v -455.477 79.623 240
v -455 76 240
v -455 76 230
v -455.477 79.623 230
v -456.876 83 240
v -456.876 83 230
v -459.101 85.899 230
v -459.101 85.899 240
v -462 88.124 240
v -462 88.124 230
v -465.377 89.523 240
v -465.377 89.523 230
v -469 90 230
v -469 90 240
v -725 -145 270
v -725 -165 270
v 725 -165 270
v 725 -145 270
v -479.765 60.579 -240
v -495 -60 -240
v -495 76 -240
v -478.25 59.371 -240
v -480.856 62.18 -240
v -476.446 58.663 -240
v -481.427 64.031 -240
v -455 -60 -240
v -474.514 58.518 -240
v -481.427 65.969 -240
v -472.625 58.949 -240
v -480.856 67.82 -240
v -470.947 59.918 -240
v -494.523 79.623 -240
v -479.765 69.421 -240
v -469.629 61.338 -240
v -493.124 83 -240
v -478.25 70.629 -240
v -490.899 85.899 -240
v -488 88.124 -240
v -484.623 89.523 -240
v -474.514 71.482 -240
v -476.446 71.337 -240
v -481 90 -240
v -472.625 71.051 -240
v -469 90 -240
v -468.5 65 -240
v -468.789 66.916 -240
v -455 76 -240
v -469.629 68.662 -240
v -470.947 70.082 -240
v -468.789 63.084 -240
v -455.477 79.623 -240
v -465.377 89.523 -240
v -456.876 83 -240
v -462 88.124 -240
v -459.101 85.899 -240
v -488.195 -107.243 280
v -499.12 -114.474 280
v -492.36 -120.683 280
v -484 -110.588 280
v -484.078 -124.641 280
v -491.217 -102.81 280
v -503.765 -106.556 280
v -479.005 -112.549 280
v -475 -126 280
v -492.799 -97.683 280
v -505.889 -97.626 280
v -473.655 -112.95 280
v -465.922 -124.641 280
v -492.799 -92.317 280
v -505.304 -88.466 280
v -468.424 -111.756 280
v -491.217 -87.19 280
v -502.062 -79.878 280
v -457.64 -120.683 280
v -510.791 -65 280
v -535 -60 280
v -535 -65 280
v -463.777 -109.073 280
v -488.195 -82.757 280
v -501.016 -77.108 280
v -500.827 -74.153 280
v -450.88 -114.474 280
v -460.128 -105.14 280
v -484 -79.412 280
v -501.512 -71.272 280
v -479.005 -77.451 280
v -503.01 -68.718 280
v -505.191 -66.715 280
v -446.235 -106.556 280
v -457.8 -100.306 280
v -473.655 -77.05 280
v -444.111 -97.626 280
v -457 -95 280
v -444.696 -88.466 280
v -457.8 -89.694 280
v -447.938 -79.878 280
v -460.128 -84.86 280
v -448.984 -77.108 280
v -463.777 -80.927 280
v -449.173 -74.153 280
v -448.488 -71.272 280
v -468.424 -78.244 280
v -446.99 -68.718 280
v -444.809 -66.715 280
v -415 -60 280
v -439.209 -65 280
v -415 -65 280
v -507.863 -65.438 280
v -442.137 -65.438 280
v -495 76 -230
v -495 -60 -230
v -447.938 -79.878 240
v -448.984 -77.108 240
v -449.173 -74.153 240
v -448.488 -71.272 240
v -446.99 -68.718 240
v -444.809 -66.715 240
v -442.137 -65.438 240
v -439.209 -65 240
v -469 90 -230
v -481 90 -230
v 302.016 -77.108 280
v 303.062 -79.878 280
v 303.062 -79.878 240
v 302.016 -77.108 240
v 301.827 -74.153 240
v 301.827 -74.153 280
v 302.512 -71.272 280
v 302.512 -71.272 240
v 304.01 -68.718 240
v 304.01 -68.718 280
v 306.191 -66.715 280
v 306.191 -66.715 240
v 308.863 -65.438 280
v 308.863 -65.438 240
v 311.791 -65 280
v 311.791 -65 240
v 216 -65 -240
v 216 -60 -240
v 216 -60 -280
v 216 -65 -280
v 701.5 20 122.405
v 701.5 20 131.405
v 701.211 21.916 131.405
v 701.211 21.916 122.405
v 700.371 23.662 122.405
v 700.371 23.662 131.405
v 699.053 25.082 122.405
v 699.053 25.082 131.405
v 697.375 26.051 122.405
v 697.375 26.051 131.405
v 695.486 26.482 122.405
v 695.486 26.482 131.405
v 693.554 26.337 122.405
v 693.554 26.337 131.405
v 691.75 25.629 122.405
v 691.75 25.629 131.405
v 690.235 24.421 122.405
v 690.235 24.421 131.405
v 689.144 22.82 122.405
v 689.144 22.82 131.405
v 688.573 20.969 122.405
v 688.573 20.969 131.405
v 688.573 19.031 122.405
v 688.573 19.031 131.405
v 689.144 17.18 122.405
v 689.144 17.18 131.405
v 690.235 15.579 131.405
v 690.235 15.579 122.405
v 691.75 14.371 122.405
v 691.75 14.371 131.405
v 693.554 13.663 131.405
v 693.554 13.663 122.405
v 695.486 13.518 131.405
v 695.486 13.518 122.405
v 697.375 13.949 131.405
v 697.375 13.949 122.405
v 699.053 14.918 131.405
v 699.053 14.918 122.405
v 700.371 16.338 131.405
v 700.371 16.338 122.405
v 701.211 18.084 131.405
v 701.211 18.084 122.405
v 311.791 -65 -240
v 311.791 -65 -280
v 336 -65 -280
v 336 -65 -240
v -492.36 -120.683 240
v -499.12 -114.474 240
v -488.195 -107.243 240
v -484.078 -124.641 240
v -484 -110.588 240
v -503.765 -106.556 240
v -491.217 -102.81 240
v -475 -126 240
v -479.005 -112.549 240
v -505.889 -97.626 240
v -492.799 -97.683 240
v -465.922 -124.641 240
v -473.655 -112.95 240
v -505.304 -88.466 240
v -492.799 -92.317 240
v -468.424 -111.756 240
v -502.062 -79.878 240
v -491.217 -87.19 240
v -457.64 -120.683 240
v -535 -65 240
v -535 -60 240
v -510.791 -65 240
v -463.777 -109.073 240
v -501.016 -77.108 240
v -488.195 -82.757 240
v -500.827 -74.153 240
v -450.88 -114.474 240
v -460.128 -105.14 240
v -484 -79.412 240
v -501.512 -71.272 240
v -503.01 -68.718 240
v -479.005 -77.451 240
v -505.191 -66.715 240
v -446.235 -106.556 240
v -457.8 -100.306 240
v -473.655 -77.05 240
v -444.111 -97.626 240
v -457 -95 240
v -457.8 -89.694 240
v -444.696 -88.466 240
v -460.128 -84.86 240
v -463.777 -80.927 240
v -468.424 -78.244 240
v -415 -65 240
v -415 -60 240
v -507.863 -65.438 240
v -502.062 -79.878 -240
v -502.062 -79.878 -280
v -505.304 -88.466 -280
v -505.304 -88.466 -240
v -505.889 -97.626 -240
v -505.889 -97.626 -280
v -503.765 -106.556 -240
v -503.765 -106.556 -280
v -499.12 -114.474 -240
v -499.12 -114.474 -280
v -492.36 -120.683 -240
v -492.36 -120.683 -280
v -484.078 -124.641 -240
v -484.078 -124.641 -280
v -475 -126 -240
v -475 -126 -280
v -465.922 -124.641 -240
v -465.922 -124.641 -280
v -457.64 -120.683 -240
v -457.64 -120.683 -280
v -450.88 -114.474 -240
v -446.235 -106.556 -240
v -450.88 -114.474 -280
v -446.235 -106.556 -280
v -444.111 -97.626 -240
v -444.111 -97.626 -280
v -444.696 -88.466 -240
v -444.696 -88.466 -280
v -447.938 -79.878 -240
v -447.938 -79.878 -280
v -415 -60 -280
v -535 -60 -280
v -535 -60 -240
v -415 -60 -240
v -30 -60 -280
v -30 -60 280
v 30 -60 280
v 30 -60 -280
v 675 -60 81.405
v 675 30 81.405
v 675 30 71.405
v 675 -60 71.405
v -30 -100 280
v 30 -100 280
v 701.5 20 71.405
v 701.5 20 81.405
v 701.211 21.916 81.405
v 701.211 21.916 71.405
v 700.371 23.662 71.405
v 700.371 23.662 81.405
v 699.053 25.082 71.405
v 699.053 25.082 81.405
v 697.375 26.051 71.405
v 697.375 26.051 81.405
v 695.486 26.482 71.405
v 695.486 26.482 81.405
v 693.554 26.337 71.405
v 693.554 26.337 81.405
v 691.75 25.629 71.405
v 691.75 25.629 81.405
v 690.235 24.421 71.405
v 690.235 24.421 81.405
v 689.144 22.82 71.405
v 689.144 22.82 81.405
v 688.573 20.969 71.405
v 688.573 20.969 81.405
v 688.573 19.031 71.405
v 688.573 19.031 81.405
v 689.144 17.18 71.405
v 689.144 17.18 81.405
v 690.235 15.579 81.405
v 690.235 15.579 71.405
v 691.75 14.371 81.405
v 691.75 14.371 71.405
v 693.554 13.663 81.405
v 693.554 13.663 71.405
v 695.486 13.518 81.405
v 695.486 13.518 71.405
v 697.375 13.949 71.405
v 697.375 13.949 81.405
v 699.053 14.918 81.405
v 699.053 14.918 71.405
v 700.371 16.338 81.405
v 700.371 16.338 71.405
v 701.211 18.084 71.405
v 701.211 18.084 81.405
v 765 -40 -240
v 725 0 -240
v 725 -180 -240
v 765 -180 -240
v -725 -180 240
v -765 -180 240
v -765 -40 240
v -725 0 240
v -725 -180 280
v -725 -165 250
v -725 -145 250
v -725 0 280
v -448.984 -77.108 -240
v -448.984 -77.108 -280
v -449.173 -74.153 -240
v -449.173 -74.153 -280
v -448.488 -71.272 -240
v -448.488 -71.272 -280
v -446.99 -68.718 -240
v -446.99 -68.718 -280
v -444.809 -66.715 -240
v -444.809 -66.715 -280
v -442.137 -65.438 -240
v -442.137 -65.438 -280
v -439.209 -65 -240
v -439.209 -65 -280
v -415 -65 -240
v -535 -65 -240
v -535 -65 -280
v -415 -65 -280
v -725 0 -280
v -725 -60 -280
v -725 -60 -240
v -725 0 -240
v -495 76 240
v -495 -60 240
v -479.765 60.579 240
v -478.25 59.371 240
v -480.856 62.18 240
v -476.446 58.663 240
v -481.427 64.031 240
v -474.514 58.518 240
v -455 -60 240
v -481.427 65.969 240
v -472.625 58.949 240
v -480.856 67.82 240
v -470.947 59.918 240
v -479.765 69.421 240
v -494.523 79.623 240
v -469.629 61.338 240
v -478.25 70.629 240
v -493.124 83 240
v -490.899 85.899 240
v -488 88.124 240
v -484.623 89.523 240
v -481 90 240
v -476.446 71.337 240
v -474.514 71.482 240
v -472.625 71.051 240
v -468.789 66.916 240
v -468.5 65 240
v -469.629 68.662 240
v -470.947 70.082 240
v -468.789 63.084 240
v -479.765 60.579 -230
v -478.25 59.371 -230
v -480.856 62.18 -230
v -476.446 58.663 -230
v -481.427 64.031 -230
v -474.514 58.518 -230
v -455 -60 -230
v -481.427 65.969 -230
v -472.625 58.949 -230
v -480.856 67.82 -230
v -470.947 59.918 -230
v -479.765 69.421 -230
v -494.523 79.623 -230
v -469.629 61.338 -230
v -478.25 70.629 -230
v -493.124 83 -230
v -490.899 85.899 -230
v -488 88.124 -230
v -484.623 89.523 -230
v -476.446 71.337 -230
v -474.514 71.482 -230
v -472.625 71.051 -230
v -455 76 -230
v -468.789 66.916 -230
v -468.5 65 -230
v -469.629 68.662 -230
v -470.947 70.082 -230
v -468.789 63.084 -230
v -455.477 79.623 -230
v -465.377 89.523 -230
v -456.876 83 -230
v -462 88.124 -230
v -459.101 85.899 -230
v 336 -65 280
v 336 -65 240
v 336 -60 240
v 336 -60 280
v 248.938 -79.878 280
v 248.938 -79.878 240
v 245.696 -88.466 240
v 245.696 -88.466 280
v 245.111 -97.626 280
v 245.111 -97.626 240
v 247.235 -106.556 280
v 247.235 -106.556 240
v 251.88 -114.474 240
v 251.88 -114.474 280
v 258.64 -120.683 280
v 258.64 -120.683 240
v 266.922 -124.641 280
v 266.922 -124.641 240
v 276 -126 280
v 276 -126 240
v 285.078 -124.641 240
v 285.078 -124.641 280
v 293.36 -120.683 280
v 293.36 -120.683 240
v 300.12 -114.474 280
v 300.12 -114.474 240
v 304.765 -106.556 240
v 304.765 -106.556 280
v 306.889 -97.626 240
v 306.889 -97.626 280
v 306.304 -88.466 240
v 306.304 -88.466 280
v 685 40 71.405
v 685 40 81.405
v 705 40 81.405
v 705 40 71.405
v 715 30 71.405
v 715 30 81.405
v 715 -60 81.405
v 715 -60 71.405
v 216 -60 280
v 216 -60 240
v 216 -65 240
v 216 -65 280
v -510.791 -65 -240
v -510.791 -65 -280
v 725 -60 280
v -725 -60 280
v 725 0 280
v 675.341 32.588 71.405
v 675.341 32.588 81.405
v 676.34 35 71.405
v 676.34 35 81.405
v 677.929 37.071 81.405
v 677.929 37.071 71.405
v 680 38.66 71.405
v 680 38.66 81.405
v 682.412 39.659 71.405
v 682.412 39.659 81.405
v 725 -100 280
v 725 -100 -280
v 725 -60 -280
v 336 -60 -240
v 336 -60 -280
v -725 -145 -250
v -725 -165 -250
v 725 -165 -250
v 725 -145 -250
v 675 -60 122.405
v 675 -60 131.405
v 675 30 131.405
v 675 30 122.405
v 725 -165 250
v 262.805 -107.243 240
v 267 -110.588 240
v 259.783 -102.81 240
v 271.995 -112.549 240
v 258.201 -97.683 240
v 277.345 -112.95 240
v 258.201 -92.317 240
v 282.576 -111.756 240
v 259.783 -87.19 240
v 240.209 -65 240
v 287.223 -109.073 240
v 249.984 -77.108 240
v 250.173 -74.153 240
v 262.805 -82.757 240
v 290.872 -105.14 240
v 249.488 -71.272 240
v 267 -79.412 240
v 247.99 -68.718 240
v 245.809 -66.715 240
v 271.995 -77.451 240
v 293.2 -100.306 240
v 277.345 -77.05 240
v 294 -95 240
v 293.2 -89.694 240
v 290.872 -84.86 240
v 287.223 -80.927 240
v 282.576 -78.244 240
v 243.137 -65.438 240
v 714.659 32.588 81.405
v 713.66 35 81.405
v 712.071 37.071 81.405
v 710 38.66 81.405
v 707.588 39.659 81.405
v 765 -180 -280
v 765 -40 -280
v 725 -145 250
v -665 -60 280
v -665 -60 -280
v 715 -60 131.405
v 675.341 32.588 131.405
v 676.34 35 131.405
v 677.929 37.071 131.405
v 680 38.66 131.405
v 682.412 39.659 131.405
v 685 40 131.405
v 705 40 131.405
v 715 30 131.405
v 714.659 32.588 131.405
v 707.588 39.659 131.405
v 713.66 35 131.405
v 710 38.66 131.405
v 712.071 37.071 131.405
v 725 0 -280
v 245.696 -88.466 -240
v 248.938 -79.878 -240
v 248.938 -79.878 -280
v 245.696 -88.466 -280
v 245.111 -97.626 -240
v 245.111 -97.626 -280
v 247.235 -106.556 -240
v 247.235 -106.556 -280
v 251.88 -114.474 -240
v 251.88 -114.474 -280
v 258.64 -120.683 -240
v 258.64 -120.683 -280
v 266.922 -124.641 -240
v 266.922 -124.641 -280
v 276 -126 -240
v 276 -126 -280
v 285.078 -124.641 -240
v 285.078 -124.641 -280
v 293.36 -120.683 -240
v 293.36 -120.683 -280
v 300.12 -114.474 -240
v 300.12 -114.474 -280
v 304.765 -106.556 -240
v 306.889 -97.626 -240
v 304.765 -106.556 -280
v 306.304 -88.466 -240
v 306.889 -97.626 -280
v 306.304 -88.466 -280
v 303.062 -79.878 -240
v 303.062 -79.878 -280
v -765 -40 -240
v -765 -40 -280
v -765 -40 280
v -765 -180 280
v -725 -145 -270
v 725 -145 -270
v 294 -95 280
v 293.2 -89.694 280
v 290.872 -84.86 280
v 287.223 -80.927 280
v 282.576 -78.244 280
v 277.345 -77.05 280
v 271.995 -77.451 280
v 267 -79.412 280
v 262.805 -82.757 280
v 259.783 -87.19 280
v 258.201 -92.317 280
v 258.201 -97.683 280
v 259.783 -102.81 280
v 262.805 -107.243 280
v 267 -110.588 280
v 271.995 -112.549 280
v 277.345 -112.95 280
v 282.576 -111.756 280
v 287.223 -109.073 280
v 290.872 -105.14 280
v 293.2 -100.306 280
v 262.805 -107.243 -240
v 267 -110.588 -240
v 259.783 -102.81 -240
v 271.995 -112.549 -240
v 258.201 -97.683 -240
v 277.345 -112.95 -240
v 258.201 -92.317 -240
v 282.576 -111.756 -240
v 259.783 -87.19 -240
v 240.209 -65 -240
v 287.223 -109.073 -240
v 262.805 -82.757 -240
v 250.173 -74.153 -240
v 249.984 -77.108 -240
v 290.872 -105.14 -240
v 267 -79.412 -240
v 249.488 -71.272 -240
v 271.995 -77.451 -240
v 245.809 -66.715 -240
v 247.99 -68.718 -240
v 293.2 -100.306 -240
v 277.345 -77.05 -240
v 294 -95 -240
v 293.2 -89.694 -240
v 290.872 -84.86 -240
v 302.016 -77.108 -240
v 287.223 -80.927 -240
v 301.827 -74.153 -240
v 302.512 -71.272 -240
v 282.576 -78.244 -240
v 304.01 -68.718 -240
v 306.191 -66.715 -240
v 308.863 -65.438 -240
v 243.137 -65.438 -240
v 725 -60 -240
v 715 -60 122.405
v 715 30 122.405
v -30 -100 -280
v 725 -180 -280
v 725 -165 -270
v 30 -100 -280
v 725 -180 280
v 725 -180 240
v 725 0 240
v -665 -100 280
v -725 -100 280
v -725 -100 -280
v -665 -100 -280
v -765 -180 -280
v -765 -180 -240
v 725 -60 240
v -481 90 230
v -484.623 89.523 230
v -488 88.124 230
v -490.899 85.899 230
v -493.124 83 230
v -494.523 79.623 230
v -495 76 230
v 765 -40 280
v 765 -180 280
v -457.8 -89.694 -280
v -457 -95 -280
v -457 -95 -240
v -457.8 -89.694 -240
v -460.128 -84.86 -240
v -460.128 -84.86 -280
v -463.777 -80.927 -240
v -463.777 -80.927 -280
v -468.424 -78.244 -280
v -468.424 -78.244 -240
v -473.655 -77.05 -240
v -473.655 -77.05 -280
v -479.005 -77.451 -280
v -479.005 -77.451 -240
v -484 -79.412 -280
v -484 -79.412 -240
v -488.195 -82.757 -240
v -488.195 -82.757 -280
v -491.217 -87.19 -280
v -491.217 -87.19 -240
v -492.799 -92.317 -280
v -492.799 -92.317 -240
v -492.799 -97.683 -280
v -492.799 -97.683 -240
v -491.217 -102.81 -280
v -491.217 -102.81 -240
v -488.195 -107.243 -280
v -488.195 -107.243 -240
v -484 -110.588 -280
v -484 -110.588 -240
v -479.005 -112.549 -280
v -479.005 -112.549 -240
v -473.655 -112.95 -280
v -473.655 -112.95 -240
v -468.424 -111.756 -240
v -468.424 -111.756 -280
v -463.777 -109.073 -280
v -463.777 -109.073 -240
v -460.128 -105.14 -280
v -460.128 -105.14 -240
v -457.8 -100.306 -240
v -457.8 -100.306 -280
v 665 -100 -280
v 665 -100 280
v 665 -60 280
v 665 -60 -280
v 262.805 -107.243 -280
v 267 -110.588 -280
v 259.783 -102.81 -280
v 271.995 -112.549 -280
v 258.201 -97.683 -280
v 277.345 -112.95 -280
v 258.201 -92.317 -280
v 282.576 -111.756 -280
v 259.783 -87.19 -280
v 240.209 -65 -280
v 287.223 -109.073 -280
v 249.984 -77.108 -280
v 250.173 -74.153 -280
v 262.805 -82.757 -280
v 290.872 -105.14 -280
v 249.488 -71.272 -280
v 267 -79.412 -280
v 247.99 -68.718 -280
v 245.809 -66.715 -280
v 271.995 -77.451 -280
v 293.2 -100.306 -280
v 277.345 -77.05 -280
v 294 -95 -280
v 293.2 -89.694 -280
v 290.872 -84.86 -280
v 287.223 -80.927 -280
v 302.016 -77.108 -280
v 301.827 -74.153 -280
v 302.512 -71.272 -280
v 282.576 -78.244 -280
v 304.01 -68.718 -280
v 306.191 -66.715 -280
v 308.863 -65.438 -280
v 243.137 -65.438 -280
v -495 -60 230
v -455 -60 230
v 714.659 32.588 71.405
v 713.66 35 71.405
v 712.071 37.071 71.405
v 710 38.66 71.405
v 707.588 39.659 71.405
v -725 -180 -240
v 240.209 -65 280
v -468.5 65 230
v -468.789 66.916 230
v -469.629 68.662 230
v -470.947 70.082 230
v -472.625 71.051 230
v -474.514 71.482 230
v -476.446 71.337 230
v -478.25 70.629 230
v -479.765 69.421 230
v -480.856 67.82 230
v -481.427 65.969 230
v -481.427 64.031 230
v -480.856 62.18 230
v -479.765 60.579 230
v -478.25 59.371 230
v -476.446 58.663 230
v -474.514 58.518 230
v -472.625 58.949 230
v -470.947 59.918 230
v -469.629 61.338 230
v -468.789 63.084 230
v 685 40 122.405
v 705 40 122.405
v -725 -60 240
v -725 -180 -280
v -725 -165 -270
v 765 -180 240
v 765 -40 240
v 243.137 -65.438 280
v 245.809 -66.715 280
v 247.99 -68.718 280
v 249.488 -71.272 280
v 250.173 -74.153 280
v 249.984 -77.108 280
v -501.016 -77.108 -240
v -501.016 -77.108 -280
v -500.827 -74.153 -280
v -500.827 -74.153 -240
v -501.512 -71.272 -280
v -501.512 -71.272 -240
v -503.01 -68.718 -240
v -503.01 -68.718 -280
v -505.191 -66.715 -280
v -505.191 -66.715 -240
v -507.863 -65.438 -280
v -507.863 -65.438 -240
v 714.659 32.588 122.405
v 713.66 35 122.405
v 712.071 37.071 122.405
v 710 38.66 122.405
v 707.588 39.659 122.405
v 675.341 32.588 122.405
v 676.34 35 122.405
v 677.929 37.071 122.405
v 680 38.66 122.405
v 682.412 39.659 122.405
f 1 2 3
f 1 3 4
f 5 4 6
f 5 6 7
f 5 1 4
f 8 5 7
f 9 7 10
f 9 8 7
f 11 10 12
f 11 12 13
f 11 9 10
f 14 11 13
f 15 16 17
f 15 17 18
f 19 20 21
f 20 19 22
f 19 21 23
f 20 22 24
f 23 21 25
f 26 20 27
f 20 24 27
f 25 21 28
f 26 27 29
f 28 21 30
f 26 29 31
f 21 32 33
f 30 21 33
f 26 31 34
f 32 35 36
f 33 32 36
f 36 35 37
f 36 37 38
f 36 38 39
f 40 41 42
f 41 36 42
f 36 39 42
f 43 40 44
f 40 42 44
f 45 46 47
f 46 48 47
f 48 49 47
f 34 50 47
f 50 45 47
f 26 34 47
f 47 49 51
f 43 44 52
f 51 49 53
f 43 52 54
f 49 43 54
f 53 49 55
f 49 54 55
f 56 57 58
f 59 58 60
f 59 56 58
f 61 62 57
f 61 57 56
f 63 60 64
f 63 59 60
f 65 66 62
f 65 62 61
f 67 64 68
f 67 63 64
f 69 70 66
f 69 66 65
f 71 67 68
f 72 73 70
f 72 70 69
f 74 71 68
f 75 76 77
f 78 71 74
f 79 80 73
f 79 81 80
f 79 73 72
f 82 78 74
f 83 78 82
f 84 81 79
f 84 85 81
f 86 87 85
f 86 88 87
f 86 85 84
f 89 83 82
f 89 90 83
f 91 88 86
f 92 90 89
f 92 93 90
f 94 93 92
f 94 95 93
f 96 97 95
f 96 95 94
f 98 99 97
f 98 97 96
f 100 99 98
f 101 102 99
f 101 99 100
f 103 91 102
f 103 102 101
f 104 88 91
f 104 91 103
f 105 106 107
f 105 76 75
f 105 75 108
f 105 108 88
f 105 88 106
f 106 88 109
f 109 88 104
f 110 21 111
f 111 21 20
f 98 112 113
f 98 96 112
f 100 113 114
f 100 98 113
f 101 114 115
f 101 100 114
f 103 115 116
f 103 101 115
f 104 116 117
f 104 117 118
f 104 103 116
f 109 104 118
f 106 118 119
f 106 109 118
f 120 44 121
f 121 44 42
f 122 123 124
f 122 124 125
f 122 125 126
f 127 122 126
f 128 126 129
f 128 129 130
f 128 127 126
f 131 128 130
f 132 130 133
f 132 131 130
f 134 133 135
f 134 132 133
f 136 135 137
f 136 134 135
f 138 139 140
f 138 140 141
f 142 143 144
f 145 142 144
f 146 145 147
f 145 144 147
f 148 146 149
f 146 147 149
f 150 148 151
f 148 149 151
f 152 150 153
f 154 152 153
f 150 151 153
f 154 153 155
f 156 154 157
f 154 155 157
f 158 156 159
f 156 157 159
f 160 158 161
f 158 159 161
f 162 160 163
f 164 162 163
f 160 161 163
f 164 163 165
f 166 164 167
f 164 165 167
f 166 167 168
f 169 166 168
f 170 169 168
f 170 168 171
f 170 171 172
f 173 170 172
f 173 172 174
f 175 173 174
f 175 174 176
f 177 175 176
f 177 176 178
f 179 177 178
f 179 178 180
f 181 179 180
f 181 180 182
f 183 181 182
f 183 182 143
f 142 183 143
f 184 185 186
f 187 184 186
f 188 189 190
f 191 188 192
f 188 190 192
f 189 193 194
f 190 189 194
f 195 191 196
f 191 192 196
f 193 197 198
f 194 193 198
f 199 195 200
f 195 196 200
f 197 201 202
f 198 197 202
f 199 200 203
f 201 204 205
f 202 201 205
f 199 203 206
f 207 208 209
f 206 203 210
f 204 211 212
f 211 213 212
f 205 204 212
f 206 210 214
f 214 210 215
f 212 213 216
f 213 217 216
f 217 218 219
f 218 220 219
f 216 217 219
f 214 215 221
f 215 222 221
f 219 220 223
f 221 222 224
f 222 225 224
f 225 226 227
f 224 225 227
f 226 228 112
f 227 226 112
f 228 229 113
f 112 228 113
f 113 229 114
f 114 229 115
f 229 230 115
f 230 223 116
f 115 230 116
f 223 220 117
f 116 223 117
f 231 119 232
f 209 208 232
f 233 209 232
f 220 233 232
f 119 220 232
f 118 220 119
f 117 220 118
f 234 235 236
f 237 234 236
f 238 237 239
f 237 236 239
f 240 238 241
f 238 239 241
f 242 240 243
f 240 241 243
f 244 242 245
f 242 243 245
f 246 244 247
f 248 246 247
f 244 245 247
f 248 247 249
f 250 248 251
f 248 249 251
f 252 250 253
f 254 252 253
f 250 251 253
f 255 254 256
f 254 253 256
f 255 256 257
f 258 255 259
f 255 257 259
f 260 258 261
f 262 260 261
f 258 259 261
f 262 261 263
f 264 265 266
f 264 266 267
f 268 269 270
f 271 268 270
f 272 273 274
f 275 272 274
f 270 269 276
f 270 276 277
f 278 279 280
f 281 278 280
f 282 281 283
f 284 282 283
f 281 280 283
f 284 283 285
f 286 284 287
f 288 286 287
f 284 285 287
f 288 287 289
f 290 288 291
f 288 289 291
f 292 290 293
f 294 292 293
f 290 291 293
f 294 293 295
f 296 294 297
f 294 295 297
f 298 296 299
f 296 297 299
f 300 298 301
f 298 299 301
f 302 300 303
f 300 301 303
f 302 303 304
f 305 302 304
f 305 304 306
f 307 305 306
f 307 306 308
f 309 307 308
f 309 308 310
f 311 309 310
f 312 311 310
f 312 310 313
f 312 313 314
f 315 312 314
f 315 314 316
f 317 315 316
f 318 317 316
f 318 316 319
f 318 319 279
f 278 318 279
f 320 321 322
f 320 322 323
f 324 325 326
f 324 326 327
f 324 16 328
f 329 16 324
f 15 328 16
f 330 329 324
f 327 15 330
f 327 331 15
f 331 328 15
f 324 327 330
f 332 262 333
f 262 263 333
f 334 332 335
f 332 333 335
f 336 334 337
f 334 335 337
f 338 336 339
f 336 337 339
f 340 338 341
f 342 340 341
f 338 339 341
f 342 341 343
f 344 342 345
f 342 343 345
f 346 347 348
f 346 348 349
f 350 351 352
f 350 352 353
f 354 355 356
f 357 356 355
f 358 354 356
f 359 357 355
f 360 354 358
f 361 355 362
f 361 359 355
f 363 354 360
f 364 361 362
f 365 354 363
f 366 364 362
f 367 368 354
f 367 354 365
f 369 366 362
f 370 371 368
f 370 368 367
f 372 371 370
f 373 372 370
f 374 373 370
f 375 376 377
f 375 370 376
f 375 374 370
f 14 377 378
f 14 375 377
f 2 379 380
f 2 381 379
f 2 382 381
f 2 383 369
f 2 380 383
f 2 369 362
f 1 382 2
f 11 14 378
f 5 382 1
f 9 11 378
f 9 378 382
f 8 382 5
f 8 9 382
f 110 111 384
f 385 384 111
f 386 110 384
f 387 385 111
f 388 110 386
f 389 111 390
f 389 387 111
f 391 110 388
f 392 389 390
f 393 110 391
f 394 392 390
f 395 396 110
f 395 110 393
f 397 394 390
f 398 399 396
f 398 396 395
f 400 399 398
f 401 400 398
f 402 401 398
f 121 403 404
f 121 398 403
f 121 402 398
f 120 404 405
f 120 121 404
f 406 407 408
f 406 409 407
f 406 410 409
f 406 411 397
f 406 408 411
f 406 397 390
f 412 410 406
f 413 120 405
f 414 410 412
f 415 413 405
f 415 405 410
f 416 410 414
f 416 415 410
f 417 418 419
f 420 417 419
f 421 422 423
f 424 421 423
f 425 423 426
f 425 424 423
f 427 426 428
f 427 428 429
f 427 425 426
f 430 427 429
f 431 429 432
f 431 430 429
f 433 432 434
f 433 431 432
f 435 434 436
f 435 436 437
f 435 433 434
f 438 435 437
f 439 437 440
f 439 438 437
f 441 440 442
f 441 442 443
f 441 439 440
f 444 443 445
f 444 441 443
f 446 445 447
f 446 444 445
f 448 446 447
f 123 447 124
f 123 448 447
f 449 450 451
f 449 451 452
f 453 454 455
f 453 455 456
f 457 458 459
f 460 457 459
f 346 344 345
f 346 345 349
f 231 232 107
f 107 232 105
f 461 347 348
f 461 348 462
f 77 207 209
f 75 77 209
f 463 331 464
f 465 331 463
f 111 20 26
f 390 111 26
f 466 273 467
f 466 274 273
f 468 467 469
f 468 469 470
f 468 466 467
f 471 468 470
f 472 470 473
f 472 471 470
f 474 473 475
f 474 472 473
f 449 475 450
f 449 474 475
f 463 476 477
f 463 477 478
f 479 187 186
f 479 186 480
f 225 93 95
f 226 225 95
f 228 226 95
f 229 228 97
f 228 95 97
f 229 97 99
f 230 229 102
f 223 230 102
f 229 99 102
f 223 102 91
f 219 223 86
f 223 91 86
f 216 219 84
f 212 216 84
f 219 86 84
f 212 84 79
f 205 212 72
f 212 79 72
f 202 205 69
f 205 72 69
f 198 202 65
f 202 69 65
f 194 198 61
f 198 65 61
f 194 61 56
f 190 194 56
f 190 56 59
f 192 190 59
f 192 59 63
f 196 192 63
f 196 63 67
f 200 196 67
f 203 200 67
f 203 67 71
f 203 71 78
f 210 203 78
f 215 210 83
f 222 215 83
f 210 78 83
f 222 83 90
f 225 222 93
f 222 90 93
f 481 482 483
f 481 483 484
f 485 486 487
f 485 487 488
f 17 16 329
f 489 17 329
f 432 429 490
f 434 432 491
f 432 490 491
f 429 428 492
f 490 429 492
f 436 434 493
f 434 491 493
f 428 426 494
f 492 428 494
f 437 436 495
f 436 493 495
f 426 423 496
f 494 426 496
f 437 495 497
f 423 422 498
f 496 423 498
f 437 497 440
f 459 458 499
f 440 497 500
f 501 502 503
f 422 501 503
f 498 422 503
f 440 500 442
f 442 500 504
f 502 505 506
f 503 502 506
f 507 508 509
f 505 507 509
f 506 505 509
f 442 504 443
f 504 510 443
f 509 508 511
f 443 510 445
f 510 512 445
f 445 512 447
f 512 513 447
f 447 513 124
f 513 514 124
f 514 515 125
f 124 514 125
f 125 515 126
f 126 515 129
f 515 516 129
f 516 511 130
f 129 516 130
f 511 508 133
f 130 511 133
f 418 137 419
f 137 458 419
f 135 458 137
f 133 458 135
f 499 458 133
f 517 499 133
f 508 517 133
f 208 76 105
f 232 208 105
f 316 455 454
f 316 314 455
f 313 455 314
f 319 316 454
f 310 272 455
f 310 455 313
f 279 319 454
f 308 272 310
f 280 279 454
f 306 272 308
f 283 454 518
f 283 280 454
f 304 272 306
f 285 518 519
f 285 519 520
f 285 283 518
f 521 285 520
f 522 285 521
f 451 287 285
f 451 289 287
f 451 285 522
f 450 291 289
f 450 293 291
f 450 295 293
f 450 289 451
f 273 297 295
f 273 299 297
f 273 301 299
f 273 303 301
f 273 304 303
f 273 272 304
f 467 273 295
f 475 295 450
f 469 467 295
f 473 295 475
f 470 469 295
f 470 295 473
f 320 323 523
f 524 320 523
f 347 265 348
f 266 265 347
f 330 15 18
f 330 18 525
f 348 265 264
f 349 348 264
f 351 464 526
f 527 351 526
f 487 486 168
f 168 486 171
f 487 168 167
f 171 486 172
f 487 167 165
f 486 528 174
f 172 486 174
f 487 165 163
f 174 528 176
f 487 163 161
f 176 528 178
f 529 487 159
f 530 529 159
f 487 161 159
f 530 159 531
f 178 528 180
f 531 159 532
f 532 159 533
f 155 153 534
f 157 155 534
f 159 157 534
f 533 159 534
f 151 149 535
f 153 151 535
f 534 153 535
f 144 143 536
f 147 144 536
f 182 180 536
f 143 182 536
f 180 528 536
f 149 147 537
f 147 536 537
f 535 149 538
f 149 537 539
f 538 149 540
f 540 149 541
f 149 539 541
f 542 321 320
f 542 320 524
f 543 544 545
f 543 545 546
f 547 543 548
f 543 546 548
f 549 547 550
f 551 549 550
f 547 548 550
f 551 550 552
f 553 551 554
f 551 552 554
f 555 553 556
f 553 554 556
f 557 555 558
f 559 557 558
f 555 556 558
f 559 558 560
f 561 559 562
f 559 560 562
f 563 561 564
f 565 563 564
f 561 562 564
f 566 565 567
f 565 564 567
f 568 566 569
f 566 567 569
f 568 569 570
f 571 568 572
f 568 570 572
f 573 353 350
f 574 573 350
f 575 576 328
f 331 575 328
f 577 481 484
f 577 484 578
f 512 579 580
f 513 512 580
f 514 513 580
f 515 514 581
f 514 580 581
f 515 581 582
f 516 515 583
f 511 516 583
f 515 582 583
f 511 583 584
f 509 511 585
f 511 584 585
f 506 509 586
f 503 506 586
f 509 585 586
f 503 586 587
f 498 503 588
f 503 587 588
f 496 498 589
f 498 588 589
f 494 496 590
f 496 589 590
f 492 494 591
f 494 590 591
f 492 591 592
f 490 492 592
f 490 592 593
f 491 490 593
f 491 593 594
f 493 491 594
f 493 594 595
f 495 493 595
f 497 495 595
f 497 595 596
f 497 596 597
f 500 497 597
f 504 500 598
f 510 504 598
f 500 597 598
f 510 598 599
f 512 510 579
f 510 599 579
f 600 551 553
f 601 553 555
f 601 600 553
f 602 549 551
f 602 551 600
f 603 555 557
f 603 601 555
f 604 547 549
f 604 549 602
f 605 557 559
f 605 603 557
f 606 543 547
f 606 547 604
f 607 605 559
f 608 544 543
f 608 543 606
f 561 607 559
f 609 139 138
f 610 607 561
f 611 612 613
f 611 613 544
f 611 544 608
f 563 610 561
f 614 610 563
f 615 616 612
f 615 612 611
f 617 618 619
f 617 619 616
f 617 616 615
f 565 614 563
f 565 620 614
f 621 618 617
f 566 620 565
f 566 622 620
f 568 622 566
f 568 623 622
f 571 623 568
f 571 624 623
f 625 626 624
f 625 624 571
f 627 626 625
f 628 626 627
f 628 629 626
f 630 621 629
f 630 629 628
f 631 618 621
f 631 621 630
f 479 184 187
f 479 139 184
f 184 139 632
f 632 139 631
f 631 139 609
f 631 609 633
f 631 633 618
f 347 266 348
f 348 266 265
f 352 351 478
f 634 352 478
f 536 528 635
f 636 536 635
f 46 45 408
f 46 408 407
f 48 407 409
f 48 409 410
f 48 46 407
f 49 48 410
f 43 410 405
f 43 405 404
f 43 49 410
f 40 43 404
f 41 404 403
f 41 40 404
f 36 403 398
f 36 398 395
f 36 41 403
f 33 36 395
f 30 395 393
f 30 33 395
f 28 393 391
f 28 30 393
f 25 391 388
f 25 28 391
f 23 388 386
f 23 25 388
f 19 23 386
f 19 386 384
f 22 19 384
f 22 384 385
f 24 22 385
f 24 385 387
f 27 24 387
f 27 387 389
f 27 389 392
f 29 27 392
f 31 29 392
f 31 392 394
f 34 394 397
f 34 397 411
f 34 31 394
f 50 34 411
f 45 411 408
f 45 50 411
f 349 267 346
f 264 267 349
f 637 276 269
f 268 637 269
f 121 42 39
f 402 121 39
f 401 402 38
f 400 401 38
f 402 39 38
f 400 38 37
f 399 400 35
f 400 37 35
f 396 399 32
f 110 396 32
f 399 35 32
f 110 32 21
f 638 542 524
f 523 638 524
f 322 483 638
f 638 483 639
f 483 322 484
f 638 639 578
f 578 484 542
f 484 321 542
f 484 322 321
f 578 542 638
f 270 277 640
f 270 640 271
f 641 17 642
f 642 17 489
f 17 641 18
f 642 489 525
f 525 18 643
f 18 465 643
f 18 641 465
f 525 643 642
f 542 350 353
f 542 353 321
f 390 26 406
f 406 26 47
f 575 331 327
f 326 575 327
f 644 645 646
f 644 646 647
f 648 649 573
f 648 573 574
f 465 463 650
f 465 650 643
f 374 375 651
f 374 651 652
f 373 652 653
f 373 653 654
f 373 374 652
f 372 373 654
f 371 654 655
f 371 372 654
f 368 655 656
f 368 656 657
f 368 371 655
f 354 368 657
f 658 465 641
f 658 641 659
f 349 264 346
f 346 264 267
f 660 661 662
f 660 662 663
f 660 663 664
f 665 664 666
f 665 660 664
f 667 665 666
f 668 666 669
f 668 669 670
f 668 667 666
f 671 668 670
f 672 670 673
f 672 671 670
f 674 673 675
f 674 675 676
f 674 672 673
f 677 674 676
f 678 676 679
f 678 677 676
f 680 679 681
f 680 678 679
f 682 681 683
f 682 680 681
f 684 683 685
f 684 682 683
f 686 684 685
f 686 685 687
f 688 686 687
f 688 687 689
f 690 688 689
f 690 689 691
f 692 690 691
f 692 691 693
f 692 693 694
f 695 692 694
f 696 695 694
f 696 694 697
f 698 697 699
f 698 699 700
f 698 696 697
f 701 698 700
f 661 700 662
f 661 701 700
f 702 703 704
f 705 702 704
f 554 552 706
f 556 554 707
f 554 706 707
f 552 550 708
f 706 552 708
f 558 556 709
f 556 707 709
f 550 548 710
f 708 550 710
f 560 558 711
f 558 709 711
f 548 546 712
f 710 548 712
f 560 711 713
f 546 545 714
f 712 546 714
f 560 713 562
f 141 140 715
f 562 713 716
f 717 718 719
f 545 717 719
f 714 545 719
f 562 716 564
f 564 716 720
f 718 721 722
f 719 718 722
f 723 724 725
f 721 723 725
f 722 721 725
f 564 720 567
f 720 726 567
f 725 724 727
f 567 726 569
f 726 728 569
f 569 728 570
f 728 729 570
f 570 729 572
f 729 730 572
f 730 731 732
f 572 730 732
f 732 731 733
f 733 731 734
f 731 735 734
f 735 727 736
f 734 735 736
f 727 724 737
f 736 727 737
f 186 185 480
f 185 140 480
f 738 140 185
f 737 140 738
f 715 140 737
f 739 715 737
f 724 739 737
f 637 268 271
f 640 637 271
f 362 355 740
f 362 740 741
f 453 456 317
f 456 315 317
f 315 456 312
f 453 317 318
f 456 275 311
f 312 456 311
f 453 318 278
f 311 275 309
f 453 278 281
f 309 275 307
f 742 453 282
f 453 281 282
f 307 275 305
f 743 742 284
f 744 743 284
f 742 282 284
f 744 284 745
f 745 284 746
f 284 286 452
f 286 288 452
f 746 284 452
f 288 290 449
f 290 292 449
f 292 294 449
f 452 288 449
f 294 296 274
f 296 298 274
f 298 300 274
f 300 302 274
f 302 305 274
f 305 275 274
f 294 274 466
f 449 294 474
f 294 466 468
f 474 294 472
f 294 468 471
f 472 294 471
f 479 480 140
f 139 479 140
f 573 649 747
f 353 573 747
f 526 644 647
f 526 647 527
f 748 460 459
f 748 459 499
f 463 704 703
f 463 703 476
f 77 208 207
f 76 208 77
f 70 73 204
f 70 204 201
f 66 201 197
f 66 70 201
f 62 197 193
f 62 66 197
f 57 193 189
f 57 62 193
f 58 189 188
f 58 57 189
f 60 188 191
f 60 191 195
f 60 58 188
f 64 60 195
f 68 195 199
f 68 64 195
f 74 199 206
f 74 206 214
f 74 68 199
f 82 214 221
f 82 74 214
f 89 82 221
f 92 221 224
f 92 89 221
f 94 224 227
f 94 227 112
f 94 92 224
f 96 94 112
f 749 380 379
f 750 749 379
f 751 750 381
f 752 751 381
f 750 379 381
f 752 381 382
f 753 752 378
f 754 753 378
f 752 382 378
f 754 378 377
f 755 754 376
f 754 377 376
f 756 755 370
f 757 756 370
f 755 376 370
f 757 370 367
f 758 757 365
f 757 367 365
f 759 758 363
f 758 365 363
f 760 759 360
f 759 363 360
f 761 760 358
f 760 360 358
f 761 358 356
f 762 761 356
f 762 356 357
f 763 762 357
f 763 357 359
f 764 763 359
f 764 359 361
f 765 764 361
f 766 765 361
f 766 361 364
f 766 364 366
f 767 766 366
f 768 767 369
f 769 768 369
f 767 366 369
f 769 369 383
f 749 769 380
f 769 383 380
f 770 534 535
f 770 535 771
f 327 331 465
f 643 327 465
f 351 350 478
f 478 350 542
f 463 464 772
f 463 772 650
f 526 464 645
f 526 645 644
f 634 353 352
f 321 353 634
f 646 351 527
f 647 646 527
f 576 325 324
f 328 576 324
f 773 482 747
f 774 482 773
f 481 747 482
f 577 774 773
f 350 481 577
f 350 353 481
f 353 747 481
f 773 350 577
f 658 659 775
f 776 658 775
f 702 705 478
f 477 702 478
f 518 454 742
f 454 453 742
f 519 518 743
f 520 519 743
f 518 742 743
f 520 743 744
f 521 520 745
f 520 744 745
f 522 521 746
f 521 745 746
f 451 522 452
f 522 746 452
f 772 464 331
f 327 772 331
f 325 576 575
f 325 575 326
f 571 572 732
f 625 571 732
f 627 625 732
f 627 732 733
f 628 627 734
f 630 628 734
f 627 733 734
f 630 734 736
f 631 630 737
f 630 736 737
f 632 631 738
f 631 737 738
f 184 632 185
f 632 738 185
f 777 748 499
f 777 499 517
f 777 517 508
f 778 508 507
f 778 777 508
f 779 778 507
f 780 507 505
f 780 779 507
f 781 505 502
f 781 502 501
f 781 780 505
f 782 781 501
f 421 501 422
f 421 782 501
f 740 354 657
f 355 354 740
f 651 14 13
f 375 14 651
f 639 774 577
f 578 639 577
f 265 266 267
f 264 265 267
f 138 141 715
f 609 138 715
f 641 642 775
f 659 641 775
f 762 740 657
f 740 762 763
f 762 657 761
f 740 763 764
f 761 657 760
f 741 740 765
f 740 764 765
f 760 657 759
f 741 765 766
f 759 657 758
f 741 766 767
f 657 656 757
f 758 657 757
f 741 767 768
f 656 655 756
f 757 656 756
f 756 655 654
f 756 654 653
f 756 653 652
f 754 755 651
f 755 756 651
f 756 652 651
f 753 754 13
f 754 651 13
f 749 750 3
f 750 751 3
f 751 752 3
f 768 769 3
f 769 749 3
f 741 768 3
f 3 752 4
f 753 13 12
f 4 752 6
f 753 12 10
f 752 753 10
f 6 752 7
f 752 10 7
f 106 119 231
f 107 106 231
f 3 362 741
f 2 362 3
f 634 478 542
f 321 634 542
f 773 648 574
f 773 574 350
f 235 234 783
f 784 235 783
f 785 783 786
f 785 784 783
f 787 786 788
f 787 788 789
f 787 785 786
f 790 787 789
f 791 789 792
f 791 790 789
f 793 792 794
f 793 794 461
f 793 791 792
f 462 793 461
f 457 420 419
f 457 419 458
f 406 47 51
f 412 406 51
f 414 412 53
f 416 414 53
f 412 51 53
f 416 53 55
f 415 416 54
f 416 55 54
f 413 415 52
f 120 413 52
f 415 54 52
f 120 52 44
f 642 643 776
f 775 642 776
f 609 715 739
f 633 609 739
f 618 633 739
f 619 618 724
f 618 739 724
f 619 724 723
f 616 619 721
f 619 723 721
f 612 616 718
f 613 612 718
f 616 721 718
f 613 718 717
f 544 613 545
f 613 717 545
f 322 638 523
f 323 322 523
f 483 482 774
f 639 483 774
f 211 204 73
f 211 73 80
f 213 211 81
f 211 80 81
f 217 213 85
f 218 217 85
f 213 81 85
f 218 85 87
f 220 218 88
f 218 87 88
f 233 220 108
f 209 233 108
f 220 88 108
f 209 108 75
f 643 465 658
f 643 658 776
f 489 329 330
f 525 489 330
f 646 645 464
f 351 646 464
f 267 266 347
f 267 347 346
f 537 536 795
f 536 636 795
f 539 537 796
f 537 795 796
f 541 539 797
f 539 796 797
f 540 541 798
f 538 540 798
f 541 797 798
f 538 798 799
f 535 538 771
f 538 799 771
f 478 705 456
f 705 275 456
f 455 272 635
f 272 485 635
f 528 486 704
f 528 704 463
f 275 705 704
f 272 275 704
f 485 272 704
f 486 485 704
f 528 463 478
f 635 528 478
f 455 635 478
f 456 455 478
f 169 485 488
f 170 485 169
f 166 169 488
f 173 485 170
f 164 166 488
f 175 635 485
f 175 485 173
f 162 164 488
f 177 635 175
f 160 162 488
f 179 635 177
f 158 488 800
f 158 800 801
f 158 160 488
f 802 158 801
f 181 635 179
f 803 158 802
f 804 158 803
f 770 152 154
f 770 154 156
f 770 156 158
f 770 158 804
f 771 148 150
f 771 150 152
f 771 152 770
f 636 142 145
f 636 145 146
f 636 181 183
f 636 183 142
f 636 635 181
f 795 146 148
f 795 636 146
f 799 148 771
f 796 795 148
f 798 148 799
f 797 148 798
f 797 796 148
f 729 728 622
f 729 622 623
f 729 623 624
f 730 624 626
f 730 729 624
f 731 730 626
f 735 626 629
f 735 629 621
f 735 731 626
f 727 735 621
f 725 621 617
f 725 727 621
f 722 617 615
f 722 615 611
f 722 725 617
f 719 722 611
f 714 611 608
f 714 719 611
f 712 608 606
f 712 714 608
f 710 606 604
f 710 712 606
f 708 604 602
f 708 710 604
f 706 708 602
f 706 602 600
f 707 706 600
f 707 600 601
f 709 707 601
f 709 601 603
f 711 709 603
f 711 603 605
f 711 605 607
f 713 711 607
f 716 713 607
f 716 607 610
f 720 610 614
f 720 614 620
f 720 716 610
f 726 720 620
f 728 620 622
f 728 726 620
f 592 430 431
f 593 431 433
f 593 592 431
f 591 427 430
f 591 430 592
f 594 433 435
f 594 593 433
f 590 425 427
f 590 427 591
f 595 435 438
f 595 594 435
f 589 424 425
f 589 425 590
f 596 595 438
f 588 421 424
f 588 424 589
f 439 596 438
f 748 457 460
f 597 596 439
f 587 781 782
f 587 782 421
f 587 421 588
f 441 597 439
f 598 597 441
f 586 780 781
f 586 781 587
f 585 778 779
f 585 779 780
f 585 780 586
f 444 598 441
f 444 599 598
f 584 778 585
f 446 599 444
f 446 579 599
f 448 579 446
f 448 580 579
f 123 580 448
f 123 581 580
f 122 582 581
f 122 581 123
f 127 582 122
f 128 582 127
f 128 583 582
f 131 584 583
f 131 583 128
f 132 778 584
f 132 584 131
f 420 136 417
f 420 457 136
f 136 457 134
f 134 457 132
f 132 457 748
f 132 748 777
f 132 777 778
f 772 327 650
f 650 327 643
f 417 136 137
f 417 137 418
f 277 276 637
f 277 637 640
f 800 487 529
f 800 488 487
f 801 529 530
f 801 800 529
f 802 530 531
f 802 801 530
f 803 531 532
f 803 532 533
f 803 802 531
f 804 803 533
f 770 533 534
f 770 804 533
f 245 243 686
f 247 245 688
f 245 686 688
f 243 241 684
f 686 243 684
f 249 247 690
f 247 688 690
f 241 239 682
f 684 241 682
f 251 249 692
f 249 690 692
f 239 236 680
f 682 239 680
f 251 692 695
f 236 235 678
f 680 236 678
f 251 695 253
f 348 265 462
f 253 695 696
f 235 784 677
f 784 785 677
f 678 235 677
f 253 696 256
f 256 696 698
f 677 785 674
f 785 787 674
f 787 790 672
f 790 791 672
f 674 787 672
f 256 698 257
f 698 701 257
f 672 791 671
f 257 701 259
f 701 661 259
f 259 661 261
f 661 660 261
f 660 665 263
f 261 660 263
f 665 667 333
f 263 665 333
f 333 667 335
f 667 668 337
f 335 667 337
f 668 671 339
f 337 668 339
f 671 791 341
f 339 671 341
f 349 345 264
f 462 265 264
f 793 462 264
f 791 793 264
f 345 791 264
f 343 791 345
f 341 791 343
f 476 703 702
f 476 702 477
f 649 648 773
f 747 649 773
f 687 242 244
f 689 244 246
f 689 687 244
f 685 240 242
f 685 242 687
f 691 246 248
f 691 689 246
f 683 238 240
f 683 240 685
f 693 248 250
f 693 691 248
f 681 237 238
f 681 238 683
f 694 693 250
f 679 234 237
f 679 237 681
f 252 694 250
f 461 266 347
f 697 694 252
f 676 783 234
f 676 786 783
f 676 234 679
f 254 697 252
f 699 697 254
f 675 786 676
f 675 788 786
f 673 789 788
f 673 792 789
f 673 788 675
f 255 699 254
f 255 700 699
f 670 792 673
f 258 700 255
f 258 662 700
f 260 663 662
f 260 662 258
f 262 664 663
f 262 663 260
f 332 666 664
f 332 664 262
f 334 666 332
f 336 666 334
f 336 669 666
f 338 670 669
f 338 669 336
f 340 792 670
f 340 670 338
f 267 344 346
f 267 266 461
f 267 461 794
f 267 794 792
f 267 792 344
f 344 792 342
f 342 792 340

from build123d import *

# Parameters (mm, degrees)
SKETCH1_W             = 40
SKETCH1_H             = 40
BOSS_EXTRUDE1_DEPTH   = 180
BOSS_EXTRUDE1_2_DEPTH = 180
BOSS_EXTRUDE1_3_DEPTH = 180
BOSS_EXTRUDE1_4_DEPTH = 180
CHAMFER1_SIZE         = 40
CHAMFER2_SIZE         = 40
CHAMFER3_SIZE         = 40
CHAMFER4_SIZE         = 40
SKETCH2_W             = 1450
SKETCH2_H             = 60
BOSS_EXTRUDE2_DEPTH   = 40
SKETCH3_W             = 60
SKETCH3_H             = 40
BOSS_EXTRUDE3_DEPTH   = 560
BOSS_EXTRUDE3_2_DEPTH = 560
BOSS_EXTRUDE3_3_DEPTH = 560
SKETCH4_W             = 20
SKETCH4_H             = 20
BOSS_EXTRUDE4_DEPTH   = 1450
SKETCH5_R             = 6.5
BOSS_EXTRUDE5_DEPTH   = 10
SKETCH6_W             = 120
SKETCH6_H             = 40
BOSS_EXTRUDE6_DEPTH   = 5
BOSS_EXTRUDE6_2_DEPTH = 5
SKETCH7_R             = 31
SKETCH7_R_2           = 18
BOSS_EXTRUDE7_DEPTH   = 40
FILLET1_R             = 10
SKETCH9_R             = 18
BOSS_EXTRUDE8_DEPTH   = 40
SKETCH10_W            = 10
SKETCH10_H            = 100
SKETCH10_W_2          = 9
BOSS_EXTRUDE9_DEPTH   = 20
FILLET2_R             = 10
SKETCH11_R            = 6.5
CUT_EXTRUDE1_DEPTH    = 62


with BuildPart() as part:
    # Sketch1 → Boss-Extrude1 (new body)
    with BuildSketch(Plane(origin=(0, 0, 0), x_dir=(1, 0, 0), z_dir=(0, 1, 0))):
        with Locations((-745, 260)):
            Rectangle(SKETCH1_W, SKETCH1_H)
    extrude(amount=-BOSS_EXTRUDE1_DEPTH)

    # Chamfer1
    chamfer1_edges = [part.edges().sort_by_distance(p)[0] for p in [
        (-765, 0, -260),
    ]]
    chamfer(chamfer1_edges, length=CHAMFER1_SIZE - 0.0001)  # a hair under: the kernel refuses the full size



with BuildPart() as body_2:
    # Sketch1 → Boss-Extrude1 2 (new body)
    with BuildSketch(Plane(origin=(0, 0, 0), x_dir=(1, 0, 0), z_dir=(0, 1, 0))):
        with Locations((-745, -260)):
            Rectangle(SKETCH1_W, SKETCH1_H)
    extrude(amount=-BOSS_EXTRUDE1_2_DEPTH)

    # Chamfer2
    chamfer2_edges = [body_2.edges().sort_by_distance(p)[0] for p in [
        (-765, 0, 260),
    ]]
    chamfer(chamfer2_edges, length=CHAMFER2_SIZE - 0.0001)  # a hair under: the kernel refuses the full size


with BuildPart() as body_3:
    # Sketch1 → Boss-Extrude1 3 (new body)
    with BuildSketch(Plane(origin=(0, 0, 0), x_dir=(1, 0, 0), z_dir=(0, 1, 0))):
        with Locations((745, -260)):
            Rectangle(SKETCH1_W, SKETCH1_H)
    extrude(amount=-BOSS_EXTRUDE1_3_DEPTH)

    # Chamfer4
    chamfer4_edges = [body_3.edges().sort_by_distance(p)[0] for p in [
        (765, 0, 260),
    ]]
    chamfer(chamfer4_edges, length=CHAMFER4_SIZE - 0.0001)  # a hair under: the kernel refuses the full size


with BuildPart() as body_4:
    # Sketch1 → Boss-Extrude1 4 (new body)
    with BuildSketch(Plane(origin=(0, 0, 0), x_dir=(1, 0, 0), z_dir=(0, 1, 0))):
        with Locations((745, 260)):
            Rectangle(SKETCH1_W, SKETCH1_H)
    extrude(amount=-BOSS_EXTRUDE1_4_DEPTH)

    # Chamfer3
    chamfer3_edges = [body_4.edges().sort_by_distance(p)[0] for p in [
        (765, 0, -260),
    ]]
    chamfer(chamfer3_edges, length=CHAMFER3_SIZE - 0.0001)  # a hair under: the kernel refuses the full size


with BuildPart() as body_5:
    # Sketch2 → Boss-Extrude2 (new body)
    with BuildSketch(Plane.XY.offset(280)):
        with Locations((0, -30)):
            Rectangle(SKETCH2_W, SKETCH2_H)
    extrude(amount=-BOSS_EXTRUDE2_DEPTH)


with BuildPart() as body_6:
    # Mirror2: mirrored copy
    add(body_5.part.mirror(Plane.XY))


with BuildPart() as body_7:
    # Sketch3 → Boss-Extrude3 (new body)
    with BuildSketch(Plane.XY.offset(280)):
        with Locations((695, -80)):
            Rectangle(SKETCH3_W, SKETCH3_H)
    extrude(amount=-BOSS_EXTRUDE3_DEPTH)

    # Sketch10 → Boss-Extrude9 (add, symmetric)
    with BuildSketch(Plane(origin=(695, 0, 0), x_dir=(0, 0, -1), z_dir=(1, 0, 0))):
        with Locations((-76.405210322, -10)):
            Rectangle(SKETCH10_W, SKETCH10_H)
        with Locations((-126.905210322, -10)):
            Rectangle(SKETCH10_W_2, SKETCH10_H)
    extrude(amount=BOSS_EXTRUDE9_DEPTH, both=True)

    # Fillet2
    fillet2_edges = [body_7.edges().sort_by_distance(p)[0] for p in [
        (675, 40, 76.405210322),
        (715, 40, 76.405210322),
        (675, 40, 126.905210322),
        (715, 40, 126.905210322),
    ]]
    fillet(fillet2_edges, radius=FILLET2_R)

    # Sketch11 → Cut-Extrude1 (cut)
    with BuildSketch(Plane.XY.offset(131.405210322)):
        with Locations((695, 20)):
            Circle(SKETCH11_R)
    extrude(amount=-CUT_EXTRUDE1_DEPTH, mode=Mode.SUBTRACT)


with BuildPart() as body_8:
    # Sketch3 → Boss-Extrude3 2 (new body)
    with BuildSketch(Plane.XY.offset(280)):
        with Locations((-695, -80)):
            Rectangle(SKETCH3_W, SKETCH3_H)
    extrude(amount=-BOSS_EXTRUDE3_2_DEPTH)


with BuildPart() as body_9:
    # Sketch3 → Boss-Extrude3 3 (new body)
    with BuildSketch(Plane.XY.offset(280)):
        with Locations((0, -80)):
            Rectangle(SKETCH3_W, SKETCH3_H)
    extrude(amount=-BOSS_EXTRUDE3_3_DEPTH)


with BuildPart() as part_1:
    add(part.part)

    add(body_2.part)  # Boss-Extrude4 merges body 2

    add(body_3.part)  # Boss-Extrude4 merges body 3

    add(body_4.part)  # Boss-Extrude4 merges body 4
    # Sketch4 → Boss-Extrude4 (add)
    with BuildSketch(Plane(origin=(-725, 0, 0), x_dir=(0, 0, -1), z_dir=(1, 0, 0))):
        with Locations((-260, -155)):
            Rectangle(SKETCH4_W, SKETCH4_H)
        with Locations((260, -155)):
            Rectangle(SKETCH4_W, SKETCH4_H)
    extrude(amount=BOSS_EXTRUDE4_DEPTH)


with BuildPart() as body_7_2:
    # Sketch5 → Boss-Extrude5 (new body)
    with BuildSketch(Plane.XY.offset(-240)):
        with BuildLine():
            Line((-495, -60), (-455, -60))
            Line((-455, -60), (-455, 76))
            ThreePointArc((-455, 76), (-459.100505063, 85.899494937), (-469, 90))
            Line((-469, 90), (-481, 90))
            ThreePointArc((-481, 90), (-490.899494937, 85.899494937), (-495, 76))
            Line((-495, 76), (-495, -60))
        make_face()
        with Locations((-475, 65)):
            Circle(SKETCH5_R, mode=Mode.SUBTRACT)
    extrude(amount=BOSS_EXTRUDE5_DEPTH)


with BuildPart() as body_8_2:
    # Mirror4: mirrored copy
    add(body_7_2.part.mirror(Plane.XY))


with BuildPart() as body_9_2:
    # Sketch6 → Boss-Extrude6 (new body)
    with BuildSketch(Plane.XZ.offset(60)):
        with Locations((-475, 260)):
            Rectangle(SKETCH6_W, SKETCH6_H)
    extrude(amount=BOSS_EXTRUDE6_DEPTH)

    # Sketch7 → Boss-Extrude7 (add)
    with BuildSketch(Plane.XY.offset(280)):
        with Locations((-475, -95)):
            Circle(SKETCH7_R)
        with Locations((-475, -95)):
            Circle(SKETCH7_R_2, mode=Mode.SUBTRACT)
    extrude(amount=-BOSS_EXTRUDE7_DEPTH)

    # Fillet1
    fillet1_edges = [body_9_2.edges().sort_by_distance(p)[0] for p in [
        (-482.810249676, -65, 260),
        (-467.189750324, -65, 260),
    ]]
    fillet(fillet1_edges, radius=FILLET1_R)


with BuildPart() as body_10:
    # Sketch6 → Boss-Extrude6 2 (new body)
    with BuildSketch(Plane.XZ.offset(60)):
        with Locations((-475, -260)):
            Rectangle(SKETCH6_W, SKETCH6_H)
    extrude(amount=BOSS_EXTRUDE6_2_DEPTH)


with BuildPart() as body_11:
    # Mirror6: mirrored copy
    add(body_9_2.part.mirror(Plane.XY))


with BuildPart() as body_12:
    # Sketch9 → Boss-Extrude8 (new body)
    with BuildSketch(Plane.XY.offset(280)):
        with BuildLine():
            Line((336, -65), (336, -60))
            Line((336, -60), (216, -60))
            Line((216, -60), (216, -65))
            Line((216, -65), (240.208939664, -65))
            ThreePointArc((240.208939664, -65), (248.833917571, -69.939391727), (248.938466575, -79.87804878))
            ThreePointArc((248.938466575, -79.87804878), (276, -126), (303.061533425, -79.87804878))
            ThreePointArc((303.061533425, -79.87804878), (303.166082429, -69.939391727), (311.791060336, -65))
            Line((311.791060336, -65), (336, -65))
        make_face()
        with Locations((276, -95)):
            Circle(SKETCH9_R, mode=Mode.SUBTRACT)
    extrude(amount=-BOSS_EXTRUDE8_DEPTH)


with BuildPart() as body_13:
    # Mirror7: mirrored copy
    add(body_12.part.mirror(Plane.XY))


solid = Compound([body_5.part, body_6.part, body_7.part, body_8.part, body_9.part, part_1.part, body_7_2.part, body_8_2.part, body_9_2.part, body_10.part, body_11.part, body_12.part, body_13.part])
